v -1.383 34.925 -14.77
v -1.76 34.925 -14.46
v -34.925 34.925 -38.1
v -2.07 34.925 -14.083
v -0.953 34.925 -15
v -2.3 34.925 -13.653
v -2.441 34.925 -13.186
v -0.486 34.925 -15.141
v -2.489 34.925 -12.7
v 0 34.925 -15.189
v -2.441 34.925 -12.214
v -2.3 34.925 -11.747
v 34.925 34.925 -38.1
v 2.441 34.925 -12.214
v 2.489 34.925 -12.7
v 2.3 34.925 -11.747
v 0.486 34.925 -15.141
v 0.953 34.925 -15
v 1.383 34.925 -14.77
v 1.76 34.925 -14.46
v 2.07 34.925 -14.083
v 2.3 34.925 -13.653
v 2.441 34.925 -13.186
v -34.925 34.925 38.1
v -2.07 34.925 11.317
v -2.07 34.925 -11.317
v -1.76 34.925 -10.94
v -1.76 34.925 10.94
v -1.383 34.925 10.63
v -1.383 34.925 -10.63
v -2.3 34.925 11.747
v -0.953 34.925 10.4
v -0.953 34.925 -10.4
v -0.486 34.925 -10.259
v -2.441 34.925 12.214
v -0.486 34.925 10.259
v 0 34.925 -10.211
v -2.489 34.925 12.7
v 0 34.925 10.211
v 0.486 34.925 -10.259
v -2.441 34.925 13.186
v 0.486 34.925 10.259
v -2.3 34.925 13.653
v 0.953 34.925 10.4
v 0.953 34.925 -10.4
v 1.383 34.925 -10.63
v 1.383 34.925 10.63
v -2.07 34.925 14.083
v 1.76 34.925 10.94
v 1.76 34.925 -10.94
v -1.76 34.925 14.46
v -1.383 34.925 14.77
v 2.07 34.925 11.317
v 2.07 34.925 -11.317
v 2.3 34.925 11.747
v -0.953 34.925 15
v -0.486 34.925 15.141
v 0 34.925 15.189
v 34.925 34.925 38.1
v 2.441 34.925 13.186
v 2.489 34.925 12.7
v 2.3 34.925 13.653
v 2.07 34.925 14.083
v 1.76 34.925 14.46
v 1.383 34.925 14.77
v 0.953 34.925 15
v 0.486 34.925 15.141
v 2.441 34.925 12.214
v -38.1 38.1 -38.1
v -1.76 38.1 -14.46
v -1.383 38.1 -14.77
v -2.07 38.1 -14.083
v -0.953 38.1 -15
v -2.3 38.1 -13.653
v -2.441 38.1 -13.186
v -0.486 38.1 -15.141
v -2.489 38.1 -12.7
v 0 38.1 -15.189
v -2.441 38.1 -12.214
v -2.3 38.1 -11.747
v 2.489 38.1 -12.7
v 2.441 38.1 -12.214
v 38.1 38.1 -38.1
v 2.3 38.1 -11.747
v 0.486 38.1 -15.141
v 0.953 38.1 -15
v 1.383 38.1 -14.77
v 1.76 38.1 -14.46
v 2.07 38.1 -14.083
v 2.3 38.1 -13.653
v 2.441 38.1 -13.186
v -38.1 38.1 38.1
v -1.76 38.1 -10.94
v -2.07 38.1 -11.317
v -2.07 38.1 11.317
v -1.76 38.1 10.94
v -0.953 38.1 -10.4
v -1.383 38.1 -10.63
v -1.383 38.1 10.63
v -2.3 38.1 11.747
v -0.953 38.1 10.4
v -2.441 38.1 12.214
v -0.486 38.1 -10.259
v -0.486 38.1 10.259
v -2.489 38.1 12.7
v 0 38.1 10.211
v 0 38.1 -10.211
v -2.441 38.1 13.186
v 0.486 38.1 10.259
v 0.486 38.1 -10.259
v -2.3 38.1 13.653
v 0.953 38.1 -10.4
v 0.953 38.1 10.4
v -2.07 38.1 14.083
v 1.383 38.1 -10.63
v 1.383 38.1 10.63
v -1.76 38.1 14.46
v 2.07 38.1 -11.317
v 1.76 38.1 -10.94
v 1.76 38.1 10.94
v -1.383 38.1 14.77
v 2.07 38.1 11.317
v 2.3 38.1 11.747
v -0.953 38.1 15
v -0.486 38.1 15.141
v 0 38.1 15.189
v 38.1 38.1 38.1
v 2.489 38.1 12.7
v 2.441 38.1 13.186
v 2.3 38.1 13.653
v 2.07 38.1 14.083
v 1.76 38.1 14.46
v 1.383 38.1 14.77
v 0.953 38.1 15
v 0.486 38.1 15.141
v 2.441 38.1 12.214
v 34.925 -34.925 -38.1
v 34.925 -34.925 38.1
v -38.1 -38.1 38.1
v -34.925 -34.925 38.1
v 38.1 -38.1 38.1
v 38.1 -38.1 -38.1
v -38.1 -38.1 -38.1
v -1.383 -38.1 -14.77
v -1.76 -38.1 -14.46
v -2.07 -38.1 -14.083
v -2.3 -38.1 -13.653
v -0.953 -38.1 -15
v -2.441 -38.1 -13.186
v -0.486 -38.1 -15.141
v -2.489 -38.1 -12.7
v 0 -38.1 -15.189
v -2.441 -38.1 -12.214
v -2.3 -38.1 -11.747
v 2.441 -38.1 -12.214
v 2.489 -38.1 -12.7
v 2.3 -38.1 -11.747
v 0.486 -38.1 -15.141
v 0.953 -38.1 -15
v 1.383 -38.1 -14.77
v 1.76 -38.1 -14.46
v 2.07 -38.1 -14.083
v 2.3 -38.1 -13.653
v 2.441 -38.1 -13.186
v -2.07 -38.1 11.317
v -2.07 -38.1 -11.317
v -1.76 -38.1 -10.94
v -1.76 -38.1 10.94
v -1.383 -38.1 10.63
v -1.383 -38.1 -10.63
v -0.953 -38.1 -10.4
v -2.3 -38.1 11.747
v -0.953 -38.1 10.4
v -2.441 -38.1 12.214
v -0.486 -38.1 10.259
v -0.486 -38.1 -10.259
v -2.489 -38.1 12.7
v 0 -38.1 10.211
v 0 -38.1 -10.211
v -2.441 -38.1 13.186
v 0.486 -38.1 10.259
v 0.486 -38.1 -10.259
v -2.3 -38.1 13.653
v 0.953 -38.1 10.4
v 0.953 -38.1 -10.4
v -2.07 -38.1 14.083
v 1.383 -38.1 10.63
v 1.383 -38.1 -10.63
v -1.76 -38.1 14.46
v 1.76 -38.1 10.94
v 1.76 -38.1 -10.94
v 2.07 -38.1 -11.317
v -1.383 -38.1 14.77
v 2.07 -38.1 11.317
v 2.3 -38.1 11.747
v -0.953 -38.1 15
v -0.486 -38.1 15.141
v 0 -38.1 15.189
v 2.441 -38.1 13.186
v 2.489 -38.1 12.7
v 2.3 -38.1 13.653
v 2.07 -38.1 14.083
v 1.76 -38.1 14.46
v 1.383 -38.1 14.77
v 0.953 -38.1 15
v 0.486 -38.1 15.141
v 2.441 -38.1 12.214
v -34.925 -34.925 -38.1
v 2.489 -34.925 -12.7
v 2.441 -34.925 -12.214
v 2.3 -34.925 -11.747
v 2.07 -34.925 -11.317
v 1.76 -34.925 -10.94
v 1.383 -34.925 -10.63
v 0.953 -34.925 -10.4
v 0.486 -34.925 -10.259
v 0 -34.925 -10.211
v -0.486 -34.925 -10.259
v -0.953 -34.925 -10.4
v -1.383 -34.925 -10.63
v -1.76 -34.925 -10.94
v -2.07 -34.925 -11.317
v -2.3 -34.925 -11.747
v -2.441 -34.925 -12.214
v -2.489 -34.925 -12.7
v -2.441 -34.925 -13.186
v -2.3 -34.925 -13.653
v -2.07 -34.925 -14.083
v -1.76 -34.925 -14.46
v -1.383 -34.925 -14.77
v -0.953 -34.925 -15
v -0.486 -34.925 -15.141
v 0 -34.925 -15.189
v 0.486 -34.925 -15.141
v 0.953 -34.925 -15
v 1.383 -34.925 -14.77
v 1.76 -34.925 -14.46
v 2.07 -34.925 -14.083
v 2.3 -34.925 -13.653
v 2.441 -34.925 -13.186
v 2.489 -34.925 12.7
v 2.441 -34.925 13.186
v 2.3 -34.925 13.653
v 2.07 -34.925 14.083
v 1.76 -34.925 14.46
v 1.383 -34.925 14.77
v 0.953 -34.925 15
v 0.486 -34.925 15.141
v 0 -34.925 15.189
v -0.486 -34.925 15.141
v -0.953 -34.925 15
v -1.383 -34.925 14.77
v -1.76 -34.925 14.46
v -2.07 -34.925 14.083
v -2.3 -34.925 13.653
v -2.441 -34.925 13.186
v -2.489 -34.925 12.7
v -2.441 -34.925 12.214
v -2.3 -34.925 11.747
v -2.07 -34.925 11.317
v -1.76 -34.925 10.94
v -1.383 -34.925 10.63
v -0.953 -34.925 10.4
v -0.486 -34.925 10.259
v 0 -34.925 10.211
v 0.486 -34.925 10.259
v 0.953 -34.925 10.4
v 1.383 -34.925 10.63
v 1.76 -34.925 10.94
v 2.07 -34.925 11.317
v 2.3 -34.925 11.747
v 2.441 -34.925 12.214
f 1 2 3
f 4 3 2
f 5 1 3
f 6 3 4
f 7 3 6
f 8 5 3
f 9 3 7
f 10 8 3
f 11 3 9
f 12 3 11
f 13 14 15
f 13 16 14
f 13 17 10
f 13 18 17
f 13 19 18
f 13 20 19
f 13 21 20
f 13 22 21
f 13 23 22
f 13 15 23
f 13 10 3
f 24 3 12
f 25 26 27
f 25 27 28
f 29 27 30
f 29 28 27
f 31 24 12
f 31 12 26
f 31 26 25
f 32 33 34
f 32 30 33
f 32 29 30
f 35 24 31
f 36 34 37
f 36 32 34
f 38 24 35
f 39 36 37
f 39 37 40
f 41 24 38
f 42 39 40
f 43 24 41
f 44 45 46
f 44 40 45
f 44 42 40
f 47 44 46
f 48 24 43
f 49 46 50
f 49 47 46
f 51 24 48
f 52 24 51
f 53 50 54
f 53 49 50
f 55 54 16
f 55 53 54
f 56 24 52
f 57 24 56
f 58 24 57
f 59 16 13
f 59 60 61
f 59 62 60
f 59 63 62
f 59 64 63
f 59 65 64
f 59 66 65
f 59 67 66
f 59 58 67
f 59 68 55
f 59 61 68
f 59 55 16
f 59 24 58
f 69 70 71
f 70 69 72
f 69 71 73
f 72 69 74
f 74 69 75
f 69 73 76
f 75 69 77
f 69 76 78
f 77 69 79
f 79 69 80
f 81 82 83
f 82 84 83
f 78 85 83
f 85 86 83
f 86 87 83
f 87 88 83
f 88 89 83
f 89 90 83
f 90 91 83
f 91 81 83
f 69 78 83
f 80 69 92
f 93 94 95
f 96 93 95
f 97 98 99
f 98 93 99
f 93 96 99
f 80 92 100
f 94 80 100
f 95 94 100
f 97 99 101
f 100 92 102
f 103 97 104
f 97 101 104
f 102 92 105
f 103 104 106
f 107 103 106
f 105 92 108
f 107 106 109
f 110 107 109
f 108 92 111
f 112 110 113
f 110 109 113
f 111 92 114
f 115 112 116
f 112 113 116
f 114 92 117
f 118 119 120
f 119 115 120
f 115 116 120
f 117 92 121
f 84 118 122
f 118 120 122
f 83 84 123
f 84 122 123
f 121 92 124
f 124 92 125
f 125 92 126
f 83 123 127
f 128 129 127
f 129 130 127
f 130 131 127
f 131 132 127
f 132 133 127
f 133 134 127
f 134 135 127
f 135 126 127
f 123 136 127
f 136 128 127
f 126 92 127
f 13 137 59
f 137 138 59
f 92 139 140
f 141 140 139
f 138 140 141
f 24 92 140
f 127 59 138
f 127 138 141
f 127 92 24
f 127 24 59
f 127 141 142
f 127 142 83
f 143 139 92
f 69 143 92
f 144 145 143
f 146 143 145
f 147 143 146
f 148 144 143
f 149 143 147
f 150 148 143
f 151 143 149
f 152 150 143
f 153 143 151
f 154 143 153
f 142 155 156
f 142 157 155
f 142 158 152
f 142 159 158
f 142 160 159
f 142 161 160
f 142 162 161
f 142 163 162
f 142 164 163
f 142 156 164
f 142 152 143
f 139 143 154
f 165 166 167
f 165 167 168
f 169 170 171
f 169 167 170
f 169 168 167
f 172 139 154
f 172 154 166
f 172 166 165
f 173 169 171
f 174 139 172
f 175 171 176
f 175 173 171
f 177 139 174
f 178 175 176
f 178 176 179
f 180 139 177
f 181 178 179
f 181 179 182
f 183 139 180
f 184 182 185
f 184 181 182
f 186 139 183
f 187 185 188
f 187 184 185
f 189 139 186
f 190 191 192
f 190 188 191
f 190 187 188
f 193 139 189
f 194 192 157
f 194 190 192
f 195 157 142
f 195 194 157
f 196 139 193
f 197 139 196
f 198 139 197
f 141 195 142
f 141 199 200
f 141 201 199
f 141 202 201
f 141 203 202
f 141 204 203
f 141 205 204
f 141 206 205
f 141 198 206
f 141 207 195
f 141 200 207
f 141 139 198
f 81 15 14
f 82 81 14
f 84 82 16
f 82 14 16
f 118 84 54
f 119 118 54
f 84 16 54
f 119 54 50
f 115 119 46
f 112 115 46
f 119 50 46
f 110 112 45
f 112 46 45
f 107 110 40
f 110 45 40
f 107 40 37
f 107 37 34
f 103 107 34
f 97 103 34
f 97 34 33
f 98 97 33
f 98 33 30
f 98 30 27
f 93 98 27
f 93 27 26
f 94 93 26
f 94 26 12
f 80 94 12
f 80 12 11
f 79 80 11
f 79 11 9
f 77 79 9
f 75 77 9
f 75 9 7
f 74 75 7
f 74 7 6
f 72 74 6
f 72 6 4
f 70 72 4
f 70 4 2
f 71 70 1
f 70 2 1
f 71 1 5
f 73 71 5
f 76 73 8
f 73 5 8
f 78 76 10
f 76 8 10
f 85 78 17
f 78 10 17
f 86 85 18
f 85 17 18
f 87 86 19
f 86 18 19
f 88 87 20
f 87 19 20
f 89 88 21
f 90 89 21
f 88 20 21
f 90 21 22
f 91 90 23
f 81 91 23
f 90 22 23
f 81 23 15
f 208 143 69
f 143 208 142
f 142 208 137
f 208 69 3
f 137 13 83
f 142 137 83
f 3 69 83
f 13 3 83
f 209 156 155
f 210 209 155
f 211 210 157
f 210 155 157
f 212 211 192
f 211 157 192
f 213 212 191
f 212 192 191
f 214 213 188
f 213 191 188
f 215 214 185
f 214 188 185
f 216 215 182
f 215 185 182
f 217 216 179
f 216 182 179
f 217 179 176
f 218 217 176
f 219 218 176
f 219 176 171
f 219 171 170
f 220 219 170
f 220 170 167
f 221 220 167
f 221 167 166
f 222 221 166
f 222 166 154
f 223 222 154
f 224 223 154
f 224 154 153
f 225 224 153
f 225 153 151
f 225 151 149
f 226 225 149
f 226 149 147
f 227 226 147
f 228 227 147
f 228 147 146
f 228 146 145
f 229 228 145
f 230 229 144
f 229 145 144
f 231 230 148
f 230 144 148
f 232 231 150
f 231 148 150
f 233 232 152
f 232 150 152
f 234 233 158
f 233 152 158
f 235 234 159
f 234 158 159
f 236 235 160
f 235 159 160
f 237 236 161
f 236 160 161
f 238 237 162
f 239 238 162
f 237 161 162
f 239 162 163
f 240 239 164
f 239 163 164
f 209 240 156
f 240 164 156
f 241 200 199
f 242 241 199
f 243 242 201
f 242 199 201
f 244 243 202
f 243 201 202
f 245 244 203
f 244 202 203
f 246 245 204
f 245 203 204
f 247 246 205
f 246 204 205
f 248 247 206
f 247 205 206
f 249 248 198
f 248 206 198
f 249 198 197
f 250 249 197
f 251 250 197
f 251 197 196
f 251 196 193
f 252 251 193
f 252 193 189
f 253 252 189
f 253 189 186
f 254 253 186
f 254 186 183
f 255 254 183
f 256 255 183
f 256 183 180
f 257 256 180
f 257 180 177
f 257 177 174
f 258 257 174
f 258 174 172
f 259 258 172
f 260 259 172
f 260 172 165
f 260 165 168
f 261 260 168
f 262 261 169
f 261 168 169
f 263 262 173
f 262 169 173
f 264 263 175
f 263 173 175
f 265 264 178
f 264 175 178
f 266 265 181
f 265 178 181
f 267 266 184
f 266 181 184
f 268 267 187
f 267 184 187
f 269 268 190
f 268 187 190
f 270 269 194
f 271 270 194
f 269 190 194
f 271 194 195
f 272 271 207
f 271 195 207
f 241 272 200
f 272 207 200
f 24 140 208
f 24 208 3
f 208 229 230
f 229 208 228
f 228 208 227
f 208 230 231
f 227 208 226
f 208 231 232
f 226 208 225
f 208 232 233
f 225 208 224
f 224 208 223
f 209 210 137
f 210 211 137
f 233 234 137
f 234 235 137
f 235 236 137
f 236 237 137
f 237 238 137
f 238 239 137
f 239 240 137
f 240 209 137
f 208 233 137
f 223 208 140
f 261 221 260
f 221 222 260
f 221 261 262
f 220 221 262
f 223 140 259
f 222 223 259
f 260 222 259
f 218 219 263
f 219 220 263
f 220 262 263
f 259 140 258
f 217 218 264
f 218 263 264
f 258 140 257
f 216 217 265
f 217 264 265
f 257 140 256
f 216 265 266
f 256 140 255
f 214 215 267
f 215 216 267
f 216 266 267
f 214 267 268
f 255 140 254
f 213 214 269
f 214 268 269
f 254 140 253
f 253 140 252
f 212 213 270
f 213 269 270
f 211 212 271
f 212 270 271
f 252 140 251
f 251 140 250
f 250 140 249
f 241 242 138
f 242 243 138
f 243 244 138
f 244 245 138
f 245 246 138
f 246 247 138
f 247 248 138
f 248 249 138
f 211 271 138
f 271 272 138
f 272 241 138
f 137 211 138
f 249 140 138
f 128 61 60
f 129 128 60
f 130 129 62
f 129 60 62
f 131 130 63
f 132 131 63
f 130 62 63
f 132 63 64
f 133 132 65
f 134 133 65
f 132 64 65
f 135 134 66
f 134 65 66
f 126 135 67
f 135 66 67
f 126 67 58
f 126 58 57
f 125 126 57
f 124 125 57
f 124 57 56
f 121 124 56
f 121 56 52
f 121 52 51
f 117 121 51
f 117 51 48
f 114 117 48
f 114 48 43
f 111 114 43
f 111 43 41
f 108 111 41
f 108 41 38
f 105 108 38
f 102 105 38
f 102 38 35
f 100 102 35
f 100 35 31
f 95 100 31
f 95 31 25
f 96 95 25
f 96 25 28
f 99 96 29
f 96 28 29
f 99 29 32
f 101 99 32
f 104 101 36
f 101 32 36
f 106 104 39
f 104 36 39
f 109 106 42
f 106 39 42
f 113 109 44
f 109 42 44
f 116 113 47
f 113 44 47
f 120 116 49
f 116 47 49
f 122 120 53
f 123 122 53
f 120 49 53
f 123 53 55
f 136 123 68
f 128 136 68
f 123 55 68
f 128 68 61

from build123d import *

# Parameters (mm, degrees)
SKETCH1_W           = 76.2
SKETCH1_H           = 76.2
SKETCH1_W_2         = 69.85
SKETCH1_H_2         = 69.85
EXTRUDE_THIN1_DEPTH = 38.1
SKETCH2_R           = 2.4892
CUT_EXTRUDE1_DEPTH  = 77.2


with BuildPart() as part:
    # Sketch1 → Extrude-Thin1 (new body, symmetric)
    with BuildSketch(Plane.XY):
        Rectangle(SKETCH1_W, SKETCH1_H)
        Rectangle(SKETCH1_W_2, SKETCH1_H_2, mode=Mode.SUBTRACT)
    extrude(amount=EXTRUDE_THIN1_DEPTH, both=True)

    # Sketch2 → Cut-Extrude1 (cut, through all)
    with BuildSketch(Plane.XZ.offset(38.1)):
        with Locations((0, 12.7)):
            Circle(SKETCH2_R)
        with Locations((0, -12.7)):
            Circle(SKETCH2_R)
    extrude(amount=-CUT_EXTRUDE1_DEPTH, mode=Mode.SUBTRACT)


solid = part.part
